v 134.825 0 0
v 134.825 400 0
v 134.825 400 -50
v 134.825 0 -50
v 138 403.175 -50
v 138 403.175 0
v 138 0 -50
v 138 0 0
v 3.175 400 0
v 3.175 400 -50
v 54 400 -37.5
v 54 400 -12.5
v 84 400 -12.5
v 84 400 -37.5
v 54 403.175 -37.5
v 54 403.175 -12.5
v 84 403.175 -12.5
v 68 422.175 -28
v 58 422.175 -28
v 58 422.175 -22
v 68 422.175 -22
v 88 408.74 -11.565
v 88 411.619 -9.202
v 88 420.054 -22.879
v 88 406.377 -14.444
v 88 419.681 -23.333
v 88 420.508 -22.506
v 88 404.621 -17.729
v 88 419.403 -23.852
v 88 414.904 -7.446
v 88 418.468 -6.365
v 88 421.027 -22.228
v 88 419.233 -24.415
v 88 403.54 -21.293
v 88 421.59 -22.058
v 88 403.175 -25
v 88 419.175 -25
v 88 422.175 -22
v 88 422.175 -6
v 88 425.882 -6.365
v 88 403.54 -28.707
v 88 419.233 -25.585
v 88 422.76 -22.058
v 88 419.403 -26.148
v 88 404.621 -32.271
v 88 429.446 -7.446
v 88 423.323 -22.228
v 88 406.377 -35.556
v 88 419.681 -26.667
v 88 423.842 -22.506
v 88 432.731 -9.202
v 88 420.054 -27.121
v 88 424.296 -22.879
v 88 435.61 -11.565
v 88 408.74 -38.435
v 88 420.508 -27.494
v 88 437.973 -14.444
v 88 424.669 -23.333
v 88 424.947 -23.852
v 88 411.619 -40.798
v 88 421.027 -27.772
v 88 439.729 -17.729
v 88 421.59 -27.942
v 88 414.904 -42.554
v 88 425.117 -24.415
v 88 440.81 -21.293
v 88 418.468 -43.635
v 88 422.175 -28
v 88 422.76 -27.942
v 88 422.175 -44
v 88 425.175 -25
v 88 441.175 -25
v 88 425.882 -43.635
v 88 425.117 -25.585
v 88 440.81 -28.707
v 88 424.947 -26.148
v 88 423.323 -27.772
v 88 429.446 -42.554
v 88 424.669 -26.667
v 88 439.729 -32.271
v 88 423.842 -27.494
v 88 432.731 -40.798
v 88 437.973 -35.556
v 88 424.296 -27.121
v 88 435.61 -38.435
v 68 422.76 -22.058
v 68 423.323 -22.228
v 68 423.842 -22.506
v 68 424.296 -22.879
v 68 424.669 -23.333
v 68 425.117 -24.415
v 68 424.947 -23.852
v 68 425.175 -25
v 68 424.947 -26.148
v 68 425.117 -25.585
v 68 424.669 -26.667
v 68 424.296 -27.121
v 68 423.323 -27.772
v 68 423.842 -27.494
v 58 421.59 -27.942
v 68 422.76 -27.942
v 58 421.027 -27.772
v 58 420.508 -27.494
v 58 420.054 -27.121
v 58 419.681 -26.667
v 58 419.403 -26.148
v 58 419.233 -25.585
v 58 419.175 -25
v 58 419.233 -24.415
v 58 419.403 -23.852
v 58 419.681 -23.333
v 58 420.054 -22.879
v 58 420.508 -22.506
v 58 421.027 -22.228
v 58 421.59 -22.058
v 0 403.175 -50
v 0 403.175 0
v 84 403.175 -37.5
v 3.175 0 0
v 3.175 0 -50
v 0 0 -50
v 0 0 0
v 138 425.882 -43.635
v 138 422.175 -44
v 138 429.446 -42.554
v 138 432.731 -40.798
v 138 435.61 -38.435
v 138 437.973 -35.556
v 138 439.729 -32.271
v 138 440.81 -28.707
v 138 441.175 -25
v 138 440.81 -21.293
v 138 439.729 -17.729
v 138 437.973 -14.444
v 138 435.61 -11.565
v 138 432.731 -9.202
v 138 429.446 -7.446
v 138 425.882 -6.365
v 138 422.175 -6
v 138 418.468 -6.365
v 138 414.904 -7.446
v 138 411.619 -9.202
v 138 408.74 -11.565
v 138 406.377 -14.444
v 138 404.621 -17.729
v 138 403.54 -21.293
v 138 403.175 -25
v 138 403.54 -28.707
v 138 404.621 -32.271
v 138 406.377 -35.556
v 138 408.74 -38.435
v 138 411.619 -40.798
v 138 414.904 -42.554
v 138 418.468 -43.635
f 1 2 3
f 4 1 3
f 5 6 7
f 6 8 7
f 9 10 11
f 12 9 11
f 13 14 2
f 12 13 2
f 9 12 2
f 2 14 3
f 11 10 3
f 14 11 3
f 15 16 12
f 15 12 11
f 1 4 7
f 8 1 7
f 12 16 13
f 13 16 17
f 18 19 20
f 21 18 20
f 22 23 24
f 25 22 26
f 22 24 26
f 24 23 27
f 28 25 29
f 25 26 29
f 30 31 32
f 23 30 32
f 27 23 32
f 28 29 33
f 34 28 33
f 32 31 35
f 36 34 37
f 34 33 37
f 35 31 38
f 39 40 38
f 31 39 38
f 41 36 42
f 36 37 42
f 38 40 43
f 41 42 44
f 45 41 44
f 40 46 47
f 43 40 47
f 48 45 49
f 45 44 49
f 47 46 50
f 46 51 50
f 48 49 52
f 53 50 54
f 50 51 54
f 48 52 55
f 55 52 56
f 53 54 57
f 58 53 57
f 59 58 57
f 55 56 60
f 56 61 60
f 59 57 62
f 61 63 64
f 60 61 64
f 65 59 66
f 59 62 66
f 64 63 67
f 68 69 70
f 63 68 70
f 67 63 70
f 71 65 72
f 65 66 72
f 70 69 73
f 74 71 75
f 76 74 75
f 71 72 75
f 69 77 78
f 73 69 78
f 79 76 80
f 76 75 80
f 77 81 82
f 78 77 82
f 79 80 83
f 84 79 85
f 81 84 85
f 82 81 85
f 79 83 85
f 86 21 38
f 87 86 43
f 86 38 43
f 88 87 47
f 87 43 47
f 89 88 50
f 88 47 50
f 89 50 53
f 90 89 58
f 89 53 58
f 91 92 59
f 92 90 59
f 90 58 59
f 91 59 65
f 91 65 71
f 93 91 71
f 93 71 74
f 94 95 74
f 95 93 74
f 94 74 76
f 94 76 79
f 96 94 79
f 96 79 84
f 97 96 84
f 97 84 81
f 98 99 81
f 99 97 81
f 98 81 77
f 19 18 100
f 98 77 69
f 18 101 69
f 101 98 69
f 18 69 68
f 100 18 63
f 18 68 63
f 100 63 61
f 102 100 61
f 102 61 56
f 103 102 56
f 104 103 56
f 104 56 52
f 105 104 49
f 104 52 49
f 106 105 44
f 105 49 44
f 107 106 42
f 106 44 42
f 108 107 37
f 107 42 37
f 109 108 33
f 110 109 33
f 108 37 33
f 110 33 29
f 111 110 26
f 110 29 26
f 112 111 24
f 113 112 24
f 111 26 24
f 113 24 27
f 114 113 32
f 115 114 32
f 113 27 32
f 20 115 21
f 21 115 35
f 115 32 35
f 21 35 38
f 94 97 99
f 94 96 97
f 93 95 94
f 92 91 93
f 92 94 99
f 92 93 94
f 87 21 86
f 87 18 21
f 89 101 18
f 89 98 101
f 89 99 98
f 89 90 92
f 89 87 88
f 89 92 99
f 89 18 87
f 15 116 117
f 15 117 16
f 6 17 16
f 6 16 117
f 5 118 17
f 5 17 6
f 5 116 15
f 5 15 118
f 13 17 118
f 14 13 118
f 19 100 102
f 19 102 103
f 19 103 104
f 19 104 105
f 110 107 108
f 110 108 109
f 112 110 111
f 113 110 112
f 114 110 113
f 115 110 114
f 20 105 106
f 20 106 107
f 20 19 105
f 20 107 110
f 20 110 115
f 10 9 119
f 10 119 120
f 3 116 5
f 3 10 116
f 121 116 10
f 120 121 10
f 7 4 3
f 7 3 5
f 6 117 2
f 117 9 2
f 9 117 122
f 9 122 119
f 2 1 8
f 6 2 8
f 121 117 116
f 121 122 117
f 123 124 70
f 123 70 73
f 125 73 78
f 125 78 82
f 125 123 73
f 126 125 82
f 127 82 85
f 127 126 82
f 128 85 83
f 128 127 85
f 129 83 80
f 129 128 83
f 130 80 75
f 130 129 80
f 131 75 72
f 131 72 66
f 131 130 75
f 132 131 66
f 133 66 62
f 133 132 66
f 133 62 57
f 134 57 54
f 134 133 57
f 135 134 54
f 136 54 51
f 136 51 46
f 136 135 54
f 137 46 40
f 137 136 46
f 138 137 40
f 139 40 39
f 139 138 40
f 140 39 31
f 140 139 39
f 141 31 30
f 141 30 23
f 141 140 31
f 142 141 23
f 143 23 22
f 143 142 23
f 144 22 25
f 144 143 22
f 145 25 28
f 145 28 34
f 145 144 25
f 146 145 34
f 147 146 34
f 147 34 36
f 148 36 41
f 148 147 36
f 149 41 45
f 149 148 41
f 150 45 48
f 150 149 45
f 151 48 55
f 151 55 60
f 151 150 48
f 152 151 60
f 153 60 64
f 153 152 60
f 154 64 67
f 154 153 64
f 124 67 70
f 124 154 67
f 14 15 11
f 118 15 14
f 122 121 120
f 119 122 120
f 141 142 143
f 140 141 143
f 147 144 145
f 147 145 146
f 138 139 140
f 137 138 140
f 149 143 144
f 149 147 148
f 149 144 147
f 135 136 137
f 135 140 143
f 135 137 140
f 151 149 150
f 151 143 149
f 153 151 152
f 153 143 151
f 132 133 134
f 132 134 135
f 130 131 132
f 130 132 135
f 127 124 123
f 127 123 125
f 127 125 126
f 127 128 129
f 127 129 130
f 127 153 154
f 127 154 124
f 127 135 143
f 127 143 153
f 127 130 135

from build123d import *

# Parameters (mm, degrees)
SKETCH2_W             = 3.175
SKETCH2_H             = 50
BOSS_EXTRUDE1_DEPTH   = 400
BOSS_EXTRUDE1_2_DEPTH = 400
SKETCH3_W             = 138
SKETCH3_H             = 50
BOSS_EXTRUDE2_DEPTH   = 3.175
CUT_EXTRUDE1_REACH    = 431.062
SKETCH4_W             = 30
SKETCH4_H             = 25
SKETCH5_R             = 19
BOSS_EXTRUDE3_DEPTH   = 50
SKETCH6_R             = 3
BOSS_EXTRUDE4_DEPTH   = 30
SKETCH7_W             = 6
SKETCH7_H             = 3
CUT_EXTRUDE2_DEPTH    = 10


with BuildPart() as part:
    # Sketch2 → Boss-Extrude1 (new body)
    with BuildSketch(Plane(origin=(0, 0, 0), x_dir=(1, 0, 0), z_dir=(0, 1, 0))):
        with Locations((1.5875, 25)):
            Rectangle(SKETCH2_W, SKETCH2_H)
    extrude(amount=BOSS_EXTRUDE1_DEPTH)



with BuildPart() as body_2:
    # Sketch2 → Boss-Extrude1 2 (new body)
    with BuildSketch(Plane(origin=(0, 0, 0), x_dir=(1, 0, 0), z_dir=(0, 1, 0))):
        with Locations((136.4125, 25)):
            Rectangle(SKETCH2_W, SKETCH2_H)
    extrude(amount=BOSS_EXTRUDE1_2_DEPTH)


with BuildPart() as part_1:
    add(part.part)

    add(body_2.part)  # Boss-Extrude2 merges body 2
    # Sketch3 → Boss-Extrude2 (add)
    with BuildSketch(Plane(origin=(0, 400, 0), x_dir=(1, 0, 0), z_dir=(0, 1, 0))):
        with Locations((69, 25)):
            Rectangle(SKETCH3_W, SKETCH3_H)
    extrude(amount=BOSS_EXTRUDE2_DEPTH)

    # Sketch4 → Cut-Extrude1 (cut, up to next)
    with BuildSketch(Plane(origin=(0, 403.175, 0), x_dir=(1, 0, 0), z_dir=(0, 1, 0)), mode=Mode.PRIVATE) as cut_extrude1_sk1:
        with Locations((69, 25)):
            Rectangle(SKETCH4_W, SKETCH4_H)
    cut_extrude1_tool1 = extrude(cut_extrude1_sk1.sketch, amount=-CUT_EXTRUDE1_REACH, mode=Mode.PRIVATE) & part_1.part
    add(cut_extrude1_tool1.solids().sort_by_distance((69, 403.175, -25))[0], mode=Mode.SUBTRACT)


with BuildPart() as body_2_2:
    # Sketch5 → Boss-Extrude3 (new body)
    with BuildSketch(Plane(origin=(138, 0, 0), x_dir=(0, 0, -1), z_dir=(1, 0, 0))):
        with Locations((25, 422.175)):
            Circle(SKETCH5_R)
    extrude(amount=-BOSS_EXTRUDE3_DEPTH)

    # Sketch6 → Boss-Extrude4 (add)
    with BuildSketch(Plane.ZY.offset(-88)):
        with Locations((-25, 422.175)):
            Circle(SKETCH6_R)
    extrude(amount=BOSS_EXTRUDE4_DEPTH)

    # Sketch7 → Cut-Extrude2 (cut)
    with BuildSketch(Plane.ZY.offset(-58)):
        with Locations((-25, 423.675)):
            Rectangle(SKETCH7_W, SKETCH7_H)
    extrude(amount=-CUT_EXTRUDE2_DEPTH, mode=Mode.SUBTRACT)


solid = Compound([part_1.part, body_2_2.part])
